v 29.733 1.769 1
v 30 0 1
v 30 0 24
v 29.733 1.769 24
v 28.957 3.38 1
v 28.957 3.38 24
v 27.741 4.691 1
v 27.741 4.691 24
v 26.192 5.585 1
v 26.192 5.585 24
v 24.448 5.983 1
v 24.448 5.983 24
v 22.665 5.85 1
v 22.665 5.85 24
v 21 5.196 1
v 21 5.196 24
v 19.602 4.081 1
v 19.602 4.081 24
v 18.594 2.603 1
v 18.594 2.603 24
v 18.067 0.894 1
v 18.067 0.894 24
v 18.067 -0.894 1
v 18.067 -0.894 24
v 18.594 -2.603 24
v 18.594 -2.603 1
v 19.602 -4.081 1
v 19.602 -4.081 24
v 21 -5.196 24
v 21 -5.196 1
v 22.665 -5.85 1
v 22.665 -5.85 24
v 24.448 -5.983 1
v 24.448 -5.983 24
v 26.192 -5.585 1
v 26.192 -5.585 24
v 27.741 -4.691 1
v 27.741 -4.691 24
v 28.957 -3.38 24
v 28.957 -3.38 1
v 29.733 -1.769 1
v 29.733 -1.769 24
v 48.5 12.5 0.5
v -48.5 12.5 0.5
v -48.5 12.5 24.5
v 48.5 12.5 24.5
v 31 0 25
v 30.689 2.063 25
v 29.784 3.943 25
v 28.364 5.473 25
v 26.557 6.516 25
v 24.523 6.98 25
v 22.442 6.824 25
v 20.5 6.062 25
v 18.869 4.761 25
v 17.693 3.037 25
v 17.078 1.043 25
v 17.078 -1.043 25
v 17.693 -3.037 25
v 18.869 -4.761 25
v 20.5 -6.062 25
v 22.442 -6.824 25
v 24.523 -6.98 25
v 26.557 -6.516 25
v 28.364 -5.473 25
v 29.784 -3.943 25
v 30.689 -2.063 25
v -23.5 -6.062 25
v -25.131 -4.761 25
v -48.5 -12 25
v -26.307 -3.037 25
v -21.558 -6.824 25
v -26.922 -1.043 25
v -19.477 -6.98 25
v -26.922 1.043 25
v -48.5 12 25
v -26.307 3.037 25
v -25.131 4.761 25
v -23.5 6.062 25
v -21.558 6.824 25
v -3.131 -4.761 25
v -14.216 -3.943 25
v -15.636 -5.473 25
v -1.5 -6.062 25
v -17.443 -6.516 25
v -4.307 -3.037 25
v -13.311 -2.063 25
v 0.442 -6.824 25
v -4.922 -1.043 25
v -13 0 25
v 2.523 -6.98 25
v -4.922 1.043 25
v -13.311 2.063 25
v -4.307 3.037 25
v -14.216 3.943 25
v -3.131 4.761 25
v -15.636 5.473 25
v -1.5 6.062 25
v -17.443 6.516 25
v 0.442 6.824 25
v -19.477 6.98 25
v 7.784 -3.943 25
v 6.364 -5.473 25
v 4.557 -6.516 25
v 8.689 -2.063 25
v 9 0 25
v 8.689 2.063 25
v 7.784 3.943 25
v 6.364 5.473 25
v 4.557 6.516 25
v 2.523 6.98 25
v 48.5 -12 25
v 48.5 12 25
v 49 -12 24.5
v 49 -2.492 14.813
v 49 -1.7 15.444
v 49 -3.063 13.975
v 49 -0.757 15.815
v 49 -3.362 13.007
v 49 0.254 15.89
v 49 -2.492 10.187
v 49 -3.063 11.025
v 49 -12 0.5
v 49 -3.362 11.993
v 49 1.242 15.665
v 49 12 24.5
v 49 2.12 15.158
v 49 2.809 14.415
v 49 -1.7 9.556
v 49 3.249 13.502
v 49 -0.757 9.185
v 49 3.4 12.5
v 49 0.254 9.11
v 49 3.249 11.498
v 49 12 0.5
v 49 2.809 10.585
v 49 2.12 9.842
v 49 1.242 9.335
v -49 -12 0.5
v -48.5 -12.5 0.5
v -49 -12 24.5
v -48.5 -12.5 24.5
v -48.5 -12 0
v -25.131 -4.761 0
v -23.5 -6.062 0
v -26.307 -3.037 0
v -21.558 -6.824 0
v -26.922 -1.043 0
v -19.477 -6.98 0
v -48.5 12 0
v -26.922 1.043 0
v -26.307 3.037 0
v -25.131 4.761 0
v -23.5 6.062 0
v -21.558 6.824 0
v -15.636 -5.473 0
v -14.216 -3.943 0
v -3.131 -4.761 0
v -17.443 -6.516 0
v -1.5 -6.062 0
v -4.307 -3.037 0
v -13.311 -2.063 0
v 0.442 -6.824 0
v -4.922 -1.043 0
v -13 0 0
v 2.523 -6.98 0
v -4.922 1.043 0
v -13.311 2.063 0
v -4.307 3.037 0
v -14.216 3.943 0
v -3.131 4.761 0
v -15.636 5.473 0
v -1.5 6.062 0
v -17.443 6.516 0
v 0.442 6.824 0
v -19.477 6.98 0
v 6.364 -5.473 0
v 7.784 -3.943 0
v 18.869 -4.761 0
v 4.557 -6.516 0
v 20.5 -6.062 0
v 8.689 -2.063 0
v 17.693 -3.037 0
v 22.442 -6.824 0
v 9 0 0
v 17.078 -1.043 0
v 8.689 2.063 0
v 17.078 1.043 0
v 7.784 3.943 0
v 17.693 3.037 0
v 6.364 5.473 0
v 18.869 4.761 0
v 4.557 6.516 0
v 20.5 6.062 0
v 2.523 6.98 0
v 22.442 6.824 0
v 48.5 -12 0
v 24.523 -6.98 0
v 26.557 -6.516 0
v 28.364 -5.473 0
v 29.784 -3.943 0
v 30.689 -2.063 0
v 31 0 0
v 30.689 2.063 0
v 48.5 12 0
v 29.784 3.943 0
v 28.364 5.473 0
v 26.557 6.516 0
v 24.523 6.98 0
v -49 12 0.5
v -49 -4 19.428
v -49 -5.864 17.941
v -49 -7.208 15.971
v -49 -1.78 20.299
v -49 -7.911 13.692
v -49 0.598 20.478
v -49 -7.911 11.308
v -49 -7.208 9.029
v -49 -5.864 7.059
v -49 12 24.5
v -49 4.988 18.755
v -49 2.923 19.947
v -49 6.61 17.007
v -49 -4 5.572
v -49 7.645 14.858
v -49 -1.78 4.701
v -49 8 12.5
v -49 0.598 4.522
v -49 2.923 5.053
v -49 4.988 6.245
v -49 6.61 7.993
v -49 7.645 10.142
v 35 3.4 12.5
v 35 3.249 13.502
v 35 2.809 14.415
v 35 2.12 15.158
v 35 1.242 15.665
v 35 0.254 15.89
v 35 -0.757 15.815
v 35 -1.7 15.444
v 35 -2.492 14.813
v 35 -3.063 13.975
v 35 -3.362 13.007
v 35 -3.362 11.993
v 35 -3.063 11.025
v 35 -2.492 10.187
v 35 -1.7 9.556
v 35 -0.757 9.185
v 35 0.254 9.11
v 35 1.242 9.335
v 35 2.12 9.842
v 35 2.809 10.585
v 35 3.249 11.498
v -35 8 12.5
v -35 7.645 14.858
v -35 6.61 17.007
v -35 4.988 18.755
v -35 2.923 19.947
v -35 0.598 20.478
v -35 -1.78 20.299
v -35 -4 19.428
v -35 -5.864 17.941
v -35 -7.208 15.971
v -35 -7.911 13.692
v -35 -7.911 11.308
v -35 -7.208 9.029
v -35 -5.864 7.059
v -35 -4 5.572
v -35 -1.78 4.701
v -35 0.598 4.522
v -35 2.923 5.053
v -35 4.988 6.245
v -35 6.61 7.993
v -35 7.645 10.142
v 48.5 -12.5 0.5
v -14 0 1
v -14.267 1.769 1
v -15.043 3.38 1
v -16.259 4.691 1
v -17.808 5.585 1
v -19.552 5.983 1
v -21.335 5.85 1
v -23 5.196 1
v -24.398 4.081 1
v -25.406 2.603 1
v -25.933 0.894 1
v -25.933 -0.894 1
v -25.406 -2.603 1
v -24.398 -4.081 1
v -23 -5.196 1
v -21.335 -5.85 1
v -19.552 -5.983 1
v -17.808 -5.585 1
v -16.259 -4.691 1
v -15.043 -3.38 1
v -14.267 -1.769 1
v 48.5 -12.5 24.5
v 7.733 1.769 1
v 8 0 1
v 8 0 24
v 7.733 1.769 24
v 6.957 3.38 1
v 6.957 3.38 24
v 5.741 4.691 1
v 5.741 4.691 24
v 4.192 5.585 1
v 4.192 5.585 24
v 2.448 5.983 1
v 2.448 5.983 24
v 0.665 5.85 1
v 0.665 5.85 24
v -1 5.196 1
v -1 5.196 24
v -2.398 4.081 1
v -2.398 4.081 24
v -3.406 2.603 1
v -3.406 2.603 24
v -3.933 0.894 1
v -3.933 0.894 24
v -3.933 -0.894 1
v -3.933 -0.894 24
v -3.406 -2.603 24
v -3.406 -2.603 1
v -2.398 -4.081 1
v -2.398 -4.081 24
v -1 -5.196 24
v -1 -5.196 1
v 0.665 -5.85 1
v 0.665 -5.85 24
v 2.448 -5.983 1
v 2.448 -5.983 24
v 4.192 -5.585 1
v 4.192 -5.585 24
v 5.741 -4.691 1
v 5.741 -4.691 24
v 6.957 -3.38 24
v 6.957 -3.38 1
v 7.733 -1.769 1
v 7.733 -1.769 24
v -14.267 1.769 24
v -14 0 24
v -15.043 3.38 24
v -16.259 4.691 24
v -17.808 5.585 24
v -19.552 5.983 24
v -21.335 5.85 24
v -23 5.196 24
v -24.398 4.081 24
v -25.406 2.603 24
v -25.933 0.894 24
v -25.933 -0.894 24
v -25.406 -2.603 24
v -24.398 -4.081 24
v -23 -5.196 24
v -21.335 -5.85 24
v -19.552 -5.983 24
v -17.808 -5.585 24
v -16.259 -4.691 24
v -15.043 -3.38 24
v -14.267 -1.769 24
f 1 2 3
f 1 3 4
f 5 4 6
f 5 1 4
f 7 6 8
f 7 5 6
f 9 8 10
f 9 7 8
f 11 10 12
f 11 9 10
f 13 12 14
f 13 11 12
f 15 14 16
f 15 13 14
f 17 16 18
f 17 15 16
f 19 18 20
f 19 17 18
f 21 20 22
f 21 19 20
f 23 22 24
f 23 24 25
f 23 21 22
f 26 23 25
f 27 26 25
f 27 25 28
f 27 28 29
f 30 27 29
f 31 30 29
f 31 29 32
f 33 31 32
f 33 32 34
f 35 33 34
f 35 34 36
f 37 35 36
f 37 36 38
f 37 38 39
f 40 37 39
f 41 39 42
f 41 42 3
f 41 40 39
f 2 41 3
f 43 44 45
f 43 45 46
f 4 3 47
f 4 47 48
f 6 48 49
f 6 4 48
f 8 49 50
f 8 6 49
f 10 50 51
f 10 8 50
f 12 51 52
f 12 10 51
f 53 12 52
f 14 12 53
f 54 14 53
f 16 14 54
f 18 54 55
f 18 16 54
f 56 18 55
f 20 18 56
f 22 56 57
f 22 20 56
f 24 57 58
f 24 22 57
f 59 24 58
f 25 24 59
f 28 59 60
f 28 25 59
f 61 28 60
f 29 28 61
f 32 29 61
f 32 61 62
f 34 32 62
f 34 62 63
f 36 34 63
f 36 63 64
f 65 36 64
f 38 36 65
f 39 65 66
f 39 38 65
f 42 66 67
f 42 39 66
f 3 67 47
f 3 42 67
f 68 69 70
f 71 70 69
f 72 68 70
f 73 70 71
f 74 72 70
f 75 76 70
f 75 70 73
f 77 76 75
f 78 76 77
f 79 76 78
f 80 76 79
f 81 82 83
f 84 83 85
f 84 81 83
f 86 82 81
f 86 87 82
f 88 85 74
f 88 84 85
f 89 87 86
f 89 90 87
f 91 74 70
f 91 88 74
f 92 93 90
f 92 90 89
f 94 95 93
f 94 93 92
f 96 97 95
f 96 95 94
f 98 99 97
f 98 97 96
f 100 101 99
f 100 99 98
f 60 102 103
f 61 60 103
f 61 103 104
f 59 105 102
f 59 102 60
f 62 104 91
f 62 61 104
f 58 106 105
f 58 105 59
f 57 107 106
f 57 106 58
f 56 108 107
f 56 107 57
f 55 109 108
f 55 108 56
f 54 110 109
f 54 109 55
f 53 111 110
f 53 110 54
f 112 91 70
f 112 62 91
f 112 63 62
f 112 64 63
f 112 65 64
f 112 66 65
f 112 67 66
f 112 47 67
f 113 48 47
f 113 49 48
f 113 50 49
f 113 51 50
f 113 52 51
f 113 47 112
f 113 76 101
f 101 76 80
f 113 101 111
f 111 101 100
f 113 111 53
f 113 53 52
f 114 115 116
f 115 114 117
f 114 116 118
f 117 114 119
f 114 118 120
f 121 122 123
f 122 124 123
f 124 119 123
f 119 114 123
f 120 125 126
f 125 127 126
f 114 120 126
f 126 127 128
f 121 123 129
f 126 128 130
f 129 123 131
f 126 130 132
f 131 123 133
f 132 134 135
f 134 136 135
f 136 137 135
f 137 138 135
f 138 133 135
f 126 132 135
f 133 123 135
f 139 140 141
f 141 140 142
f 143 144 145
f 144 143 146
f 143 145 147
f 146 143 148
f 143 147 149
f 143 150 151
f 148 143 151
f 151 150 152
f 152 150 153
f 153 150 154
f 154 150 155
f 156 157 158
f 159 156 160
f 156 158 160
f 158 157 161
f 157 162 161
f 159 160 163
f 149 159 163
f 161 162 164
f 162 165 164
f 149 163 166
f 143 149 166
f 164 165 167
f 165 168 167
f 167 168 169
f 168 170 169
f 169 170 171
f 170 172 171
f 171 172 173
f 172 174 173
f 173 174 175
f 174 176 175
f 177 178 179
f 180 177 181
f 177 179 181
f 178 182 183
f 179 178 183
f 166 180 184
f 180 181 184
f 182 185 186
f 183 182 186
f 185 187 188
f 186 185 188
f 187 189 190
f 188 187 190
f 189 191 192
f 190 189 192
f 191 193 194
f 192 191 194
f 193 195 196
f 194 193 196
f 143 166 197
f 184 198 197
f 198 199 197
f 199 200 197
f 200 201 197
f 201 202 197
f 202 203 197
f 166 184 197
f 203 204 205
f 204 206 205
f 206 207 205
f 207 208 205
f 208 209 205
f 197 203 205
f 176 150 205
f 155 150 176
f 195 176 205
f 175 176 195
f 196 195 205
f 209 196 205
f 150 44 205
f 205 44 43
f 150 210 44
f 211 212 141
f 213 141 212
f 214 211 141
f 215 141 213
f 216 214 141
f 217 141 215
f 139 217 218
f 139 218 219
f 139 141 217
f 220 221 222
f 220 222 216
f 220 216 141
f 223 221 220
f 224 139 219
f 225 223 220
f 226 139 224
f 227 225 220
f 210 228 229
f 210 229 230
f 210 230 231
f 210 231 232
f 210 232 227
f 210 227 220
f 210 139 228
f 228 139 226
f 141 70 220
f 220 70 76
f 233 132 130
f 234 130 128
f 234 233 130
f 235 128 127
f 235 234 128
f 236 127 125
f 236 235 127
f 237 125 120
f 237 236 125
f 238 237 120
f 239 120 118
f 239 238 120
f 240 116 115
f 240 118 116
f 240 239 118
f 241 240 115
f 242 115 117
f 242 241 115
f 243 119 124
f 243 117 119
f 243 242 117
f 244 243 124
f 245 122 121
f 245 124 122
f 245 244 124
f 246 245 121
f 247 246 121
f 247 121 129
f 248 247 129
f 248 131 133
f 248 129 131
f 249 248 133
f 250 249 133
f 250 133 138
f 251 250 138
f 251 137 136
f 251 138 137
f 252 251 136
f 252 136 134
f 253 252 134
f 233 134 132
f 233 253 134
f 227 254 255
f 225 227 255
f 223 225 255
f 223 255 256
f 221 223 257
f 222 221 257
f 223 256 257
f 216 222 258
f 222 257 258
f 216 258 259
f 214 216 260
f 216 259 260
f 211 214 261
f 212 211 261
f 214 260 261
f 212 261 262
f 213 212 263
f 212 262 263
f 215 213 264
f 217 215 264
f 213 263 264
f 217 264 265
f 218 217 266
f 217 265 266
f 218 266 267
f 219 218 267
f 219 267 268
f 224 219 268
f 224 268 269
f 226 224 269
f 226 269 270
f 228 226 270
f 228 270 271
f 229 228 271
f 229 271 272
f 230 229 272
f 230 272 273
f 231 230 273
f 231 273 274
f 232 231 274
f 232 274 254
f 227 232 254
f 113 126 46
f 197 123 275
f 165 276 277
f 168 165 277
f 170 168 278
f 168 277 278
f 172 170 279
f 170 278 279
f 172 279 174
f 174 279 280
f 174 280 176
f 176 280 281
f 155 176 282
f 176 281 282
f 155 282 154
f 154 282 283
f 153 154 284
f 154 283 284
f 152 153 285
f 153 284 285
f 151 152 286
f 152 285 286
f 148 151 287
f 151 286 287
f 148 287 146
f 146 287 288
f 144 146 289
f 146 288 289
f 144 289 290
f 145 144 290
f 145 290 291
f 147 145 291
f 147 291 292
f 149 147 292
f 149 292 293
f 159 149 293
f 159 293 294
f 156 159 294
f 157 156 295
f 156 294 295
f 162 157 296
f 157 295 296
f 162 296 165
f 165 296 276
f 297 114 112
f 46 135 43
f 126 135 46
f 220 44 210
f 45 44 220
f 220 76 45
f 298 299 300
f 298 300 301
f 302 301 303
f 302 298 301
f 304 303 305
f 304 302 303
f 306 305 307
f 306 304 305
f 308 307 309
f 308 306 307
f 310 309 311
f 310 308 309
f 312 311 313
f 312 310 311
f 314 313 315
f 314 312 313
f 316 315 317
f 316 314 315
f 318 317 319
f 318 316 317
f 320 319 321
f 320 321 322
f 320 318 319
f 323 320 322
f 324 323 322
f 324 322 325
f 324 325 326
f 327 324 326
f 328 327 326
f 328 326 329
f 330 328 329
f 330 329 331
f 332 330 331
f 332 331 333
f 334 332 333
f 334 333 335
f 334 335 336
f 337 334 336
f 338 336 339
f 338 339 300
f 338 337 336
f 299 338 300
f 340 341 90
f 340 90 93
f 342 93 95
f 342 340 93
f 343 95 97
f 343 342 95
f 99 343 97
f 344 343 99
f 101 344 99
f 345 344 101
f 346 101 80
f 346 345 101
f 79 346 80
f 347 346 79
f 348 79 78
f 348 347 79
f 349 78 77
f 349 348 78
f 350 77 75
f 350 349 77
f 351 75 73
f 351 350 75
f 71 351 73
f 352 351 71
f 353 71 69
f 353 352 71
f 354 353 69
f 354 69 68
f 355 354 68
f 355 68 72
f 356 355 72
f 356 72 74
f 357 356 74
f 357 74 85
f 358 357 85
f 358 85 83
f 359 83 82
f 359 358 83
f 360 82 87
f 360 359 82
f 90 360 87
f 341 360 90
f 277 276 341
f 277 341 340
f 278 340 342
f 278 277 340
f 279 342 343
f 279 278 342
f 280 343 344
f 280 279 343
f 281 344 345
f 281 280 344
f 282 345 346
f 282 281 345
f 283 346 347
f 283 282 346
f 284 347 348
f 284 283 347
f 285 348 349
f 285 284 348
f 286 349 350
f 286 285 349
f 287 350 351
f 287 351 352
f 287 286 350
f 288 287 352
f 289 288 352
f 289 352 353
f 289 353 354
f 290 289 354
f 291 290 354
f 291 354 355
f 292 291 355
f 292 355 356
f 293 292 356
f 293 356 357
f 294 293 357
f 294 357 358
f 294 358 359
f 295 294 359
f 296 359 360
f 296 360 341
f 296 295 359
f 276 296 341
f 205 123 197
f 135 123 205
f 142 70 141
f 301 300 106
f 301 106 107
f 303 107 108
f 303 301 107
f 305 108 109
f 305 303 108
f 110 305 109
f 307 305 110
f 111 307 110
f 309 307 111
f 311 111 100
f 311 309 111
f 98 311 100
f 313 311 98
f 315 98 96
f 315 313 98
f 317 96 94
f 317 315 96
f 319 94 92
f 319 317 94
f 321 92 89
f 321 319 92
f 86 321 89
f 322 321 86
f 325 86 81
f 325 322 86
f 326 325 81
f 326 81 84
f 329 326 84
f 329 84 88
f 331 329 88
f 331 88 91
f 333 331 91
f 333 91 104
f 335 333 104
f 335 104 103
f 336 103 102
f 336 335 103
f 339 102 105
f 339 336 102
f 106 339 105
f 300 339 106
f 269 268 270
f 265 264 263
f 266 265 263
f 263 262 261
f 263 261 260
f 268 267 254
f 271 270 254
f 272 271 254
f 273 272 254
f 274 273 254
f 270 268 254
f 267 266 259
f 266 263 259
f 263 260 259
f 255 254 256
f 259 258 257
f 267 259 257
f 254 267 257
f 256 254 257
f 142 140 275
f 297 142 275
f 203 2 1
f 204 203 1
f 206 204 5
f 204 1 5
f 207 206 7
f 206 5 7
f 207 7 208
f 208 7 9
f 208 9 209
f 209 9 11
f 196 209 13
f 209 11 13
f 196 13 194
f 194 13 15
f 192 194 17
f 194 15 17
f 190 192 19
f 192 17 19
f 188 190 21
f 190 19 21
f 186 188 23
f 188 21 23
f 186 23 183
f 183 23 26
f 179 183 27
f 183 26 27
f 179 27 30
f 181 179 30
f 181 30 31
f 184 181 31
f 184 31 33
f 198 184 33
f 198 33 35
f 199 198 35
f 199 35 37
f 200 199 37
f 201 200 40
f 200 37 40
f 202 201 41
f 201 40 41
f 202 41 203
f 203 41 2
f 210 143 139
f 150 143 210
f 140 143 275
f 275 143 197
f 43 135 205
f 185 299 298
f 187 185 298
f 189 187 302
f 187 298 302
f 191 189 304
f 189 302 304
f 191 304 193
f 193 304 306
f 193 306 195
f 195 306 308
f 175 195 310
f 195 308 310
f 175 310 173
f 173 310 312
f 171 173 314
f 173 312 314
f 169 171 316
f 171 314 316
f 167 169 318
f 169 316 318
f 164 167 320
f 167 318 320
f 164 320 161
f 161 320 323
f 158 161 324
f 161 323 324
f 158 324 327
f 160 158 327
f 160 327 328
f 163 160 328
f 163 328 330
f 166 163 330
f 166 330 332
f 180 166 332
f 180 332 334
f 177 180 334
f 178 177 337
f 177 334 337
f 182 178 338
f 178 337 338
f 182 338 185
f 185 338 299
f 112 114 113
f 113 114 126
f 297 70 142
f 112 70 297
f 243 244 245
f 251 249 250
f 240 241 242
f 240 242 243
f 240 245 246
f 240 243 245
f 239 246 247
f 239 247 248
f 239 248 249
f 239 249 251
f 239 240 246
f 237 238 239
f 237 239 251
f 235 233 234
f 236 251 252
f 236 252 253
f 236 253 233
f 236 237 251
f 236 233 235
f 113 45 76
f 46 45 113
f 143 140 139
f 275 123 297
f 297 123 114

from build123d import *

# Parameters (mm, degrees)
F0_W     = 98
F0_H     = 25
F0_R     = 6
F1_DEPTH = 25
F3_START = 35
F2_R     = 3.4
F3_DEPTH = 85
F7_START = -35
F6_R     = 8
F7_DEPTH = 65
F8_SIZE  = 0.5
F9_SIZE  = 1


with BuildPart() as f1:
    # F0 (on Top) → F1 (new body)
    with BuildSketch(Plane.XY):
        Rectangle(F0_W, F0_H)
        with Locations((-20, 0)):
            Circle(F0_R, mode=Mode.SUBTRACT)
        with Locations((2, 0)):
            Circle(F0_R, mode=Mode.SUBTRACT)
        with Locations((24, 0)):
            Circle(F0_R, mode=Mode.SUBTRACT)
    extrude(amount=F1_DEPTH)

    # F2 (on Right) → F3 (cut)
    with BuildSketch(Plane.YZ.offset(F3_START)):
        with Locations((0, 12.5)):
            Circle(F2_R)
    extrude(amount=F3_DEPTH, mode=Mode.SUBTRACT)

    # F6 (on Right) → F7 (cut)
    with BuildSketch(Plane.YZ.offset(F7_START)):
        with Locations((0, 12.5)):
            Circle(F6_R)
    extrude(amount=-F7_DEPTH, mode=Mode.SUBTRACT)

    # F8
    f8_edges = [f1.edges().sort_by_distance(p)[0] for p in [
        (49, 12.5, 12.5),
        (49, -12.5, 12.5),
        (49, 0, 0),
        (49, 0, 25),
        (-49, 0, 25),
        (0, 12.5, 25),
        (0, -12.5, 25),
        (0, -12.5, 0),
        (-49, -12.5, 12.5),
        (-49, 0, 0),
        (-49, 12.5, 12.5),
        (0, 12.5, 0),
    ]]
    chamfer(f8_edges, length=F8_SIZE)

    # F9
    f9_edges = [f1.edges().sort_by_distance(p)[0] for p in [
        (-4, 0, 0),
        (18, 0, 0),
        (-26, 0, 0),
        (-26, 0, 25),
        (-4, 0, 25),
        (18, 0, 25),
    ]]
    chamfer(f9_edges, length=F9_SIZE)


solid = f1.part
